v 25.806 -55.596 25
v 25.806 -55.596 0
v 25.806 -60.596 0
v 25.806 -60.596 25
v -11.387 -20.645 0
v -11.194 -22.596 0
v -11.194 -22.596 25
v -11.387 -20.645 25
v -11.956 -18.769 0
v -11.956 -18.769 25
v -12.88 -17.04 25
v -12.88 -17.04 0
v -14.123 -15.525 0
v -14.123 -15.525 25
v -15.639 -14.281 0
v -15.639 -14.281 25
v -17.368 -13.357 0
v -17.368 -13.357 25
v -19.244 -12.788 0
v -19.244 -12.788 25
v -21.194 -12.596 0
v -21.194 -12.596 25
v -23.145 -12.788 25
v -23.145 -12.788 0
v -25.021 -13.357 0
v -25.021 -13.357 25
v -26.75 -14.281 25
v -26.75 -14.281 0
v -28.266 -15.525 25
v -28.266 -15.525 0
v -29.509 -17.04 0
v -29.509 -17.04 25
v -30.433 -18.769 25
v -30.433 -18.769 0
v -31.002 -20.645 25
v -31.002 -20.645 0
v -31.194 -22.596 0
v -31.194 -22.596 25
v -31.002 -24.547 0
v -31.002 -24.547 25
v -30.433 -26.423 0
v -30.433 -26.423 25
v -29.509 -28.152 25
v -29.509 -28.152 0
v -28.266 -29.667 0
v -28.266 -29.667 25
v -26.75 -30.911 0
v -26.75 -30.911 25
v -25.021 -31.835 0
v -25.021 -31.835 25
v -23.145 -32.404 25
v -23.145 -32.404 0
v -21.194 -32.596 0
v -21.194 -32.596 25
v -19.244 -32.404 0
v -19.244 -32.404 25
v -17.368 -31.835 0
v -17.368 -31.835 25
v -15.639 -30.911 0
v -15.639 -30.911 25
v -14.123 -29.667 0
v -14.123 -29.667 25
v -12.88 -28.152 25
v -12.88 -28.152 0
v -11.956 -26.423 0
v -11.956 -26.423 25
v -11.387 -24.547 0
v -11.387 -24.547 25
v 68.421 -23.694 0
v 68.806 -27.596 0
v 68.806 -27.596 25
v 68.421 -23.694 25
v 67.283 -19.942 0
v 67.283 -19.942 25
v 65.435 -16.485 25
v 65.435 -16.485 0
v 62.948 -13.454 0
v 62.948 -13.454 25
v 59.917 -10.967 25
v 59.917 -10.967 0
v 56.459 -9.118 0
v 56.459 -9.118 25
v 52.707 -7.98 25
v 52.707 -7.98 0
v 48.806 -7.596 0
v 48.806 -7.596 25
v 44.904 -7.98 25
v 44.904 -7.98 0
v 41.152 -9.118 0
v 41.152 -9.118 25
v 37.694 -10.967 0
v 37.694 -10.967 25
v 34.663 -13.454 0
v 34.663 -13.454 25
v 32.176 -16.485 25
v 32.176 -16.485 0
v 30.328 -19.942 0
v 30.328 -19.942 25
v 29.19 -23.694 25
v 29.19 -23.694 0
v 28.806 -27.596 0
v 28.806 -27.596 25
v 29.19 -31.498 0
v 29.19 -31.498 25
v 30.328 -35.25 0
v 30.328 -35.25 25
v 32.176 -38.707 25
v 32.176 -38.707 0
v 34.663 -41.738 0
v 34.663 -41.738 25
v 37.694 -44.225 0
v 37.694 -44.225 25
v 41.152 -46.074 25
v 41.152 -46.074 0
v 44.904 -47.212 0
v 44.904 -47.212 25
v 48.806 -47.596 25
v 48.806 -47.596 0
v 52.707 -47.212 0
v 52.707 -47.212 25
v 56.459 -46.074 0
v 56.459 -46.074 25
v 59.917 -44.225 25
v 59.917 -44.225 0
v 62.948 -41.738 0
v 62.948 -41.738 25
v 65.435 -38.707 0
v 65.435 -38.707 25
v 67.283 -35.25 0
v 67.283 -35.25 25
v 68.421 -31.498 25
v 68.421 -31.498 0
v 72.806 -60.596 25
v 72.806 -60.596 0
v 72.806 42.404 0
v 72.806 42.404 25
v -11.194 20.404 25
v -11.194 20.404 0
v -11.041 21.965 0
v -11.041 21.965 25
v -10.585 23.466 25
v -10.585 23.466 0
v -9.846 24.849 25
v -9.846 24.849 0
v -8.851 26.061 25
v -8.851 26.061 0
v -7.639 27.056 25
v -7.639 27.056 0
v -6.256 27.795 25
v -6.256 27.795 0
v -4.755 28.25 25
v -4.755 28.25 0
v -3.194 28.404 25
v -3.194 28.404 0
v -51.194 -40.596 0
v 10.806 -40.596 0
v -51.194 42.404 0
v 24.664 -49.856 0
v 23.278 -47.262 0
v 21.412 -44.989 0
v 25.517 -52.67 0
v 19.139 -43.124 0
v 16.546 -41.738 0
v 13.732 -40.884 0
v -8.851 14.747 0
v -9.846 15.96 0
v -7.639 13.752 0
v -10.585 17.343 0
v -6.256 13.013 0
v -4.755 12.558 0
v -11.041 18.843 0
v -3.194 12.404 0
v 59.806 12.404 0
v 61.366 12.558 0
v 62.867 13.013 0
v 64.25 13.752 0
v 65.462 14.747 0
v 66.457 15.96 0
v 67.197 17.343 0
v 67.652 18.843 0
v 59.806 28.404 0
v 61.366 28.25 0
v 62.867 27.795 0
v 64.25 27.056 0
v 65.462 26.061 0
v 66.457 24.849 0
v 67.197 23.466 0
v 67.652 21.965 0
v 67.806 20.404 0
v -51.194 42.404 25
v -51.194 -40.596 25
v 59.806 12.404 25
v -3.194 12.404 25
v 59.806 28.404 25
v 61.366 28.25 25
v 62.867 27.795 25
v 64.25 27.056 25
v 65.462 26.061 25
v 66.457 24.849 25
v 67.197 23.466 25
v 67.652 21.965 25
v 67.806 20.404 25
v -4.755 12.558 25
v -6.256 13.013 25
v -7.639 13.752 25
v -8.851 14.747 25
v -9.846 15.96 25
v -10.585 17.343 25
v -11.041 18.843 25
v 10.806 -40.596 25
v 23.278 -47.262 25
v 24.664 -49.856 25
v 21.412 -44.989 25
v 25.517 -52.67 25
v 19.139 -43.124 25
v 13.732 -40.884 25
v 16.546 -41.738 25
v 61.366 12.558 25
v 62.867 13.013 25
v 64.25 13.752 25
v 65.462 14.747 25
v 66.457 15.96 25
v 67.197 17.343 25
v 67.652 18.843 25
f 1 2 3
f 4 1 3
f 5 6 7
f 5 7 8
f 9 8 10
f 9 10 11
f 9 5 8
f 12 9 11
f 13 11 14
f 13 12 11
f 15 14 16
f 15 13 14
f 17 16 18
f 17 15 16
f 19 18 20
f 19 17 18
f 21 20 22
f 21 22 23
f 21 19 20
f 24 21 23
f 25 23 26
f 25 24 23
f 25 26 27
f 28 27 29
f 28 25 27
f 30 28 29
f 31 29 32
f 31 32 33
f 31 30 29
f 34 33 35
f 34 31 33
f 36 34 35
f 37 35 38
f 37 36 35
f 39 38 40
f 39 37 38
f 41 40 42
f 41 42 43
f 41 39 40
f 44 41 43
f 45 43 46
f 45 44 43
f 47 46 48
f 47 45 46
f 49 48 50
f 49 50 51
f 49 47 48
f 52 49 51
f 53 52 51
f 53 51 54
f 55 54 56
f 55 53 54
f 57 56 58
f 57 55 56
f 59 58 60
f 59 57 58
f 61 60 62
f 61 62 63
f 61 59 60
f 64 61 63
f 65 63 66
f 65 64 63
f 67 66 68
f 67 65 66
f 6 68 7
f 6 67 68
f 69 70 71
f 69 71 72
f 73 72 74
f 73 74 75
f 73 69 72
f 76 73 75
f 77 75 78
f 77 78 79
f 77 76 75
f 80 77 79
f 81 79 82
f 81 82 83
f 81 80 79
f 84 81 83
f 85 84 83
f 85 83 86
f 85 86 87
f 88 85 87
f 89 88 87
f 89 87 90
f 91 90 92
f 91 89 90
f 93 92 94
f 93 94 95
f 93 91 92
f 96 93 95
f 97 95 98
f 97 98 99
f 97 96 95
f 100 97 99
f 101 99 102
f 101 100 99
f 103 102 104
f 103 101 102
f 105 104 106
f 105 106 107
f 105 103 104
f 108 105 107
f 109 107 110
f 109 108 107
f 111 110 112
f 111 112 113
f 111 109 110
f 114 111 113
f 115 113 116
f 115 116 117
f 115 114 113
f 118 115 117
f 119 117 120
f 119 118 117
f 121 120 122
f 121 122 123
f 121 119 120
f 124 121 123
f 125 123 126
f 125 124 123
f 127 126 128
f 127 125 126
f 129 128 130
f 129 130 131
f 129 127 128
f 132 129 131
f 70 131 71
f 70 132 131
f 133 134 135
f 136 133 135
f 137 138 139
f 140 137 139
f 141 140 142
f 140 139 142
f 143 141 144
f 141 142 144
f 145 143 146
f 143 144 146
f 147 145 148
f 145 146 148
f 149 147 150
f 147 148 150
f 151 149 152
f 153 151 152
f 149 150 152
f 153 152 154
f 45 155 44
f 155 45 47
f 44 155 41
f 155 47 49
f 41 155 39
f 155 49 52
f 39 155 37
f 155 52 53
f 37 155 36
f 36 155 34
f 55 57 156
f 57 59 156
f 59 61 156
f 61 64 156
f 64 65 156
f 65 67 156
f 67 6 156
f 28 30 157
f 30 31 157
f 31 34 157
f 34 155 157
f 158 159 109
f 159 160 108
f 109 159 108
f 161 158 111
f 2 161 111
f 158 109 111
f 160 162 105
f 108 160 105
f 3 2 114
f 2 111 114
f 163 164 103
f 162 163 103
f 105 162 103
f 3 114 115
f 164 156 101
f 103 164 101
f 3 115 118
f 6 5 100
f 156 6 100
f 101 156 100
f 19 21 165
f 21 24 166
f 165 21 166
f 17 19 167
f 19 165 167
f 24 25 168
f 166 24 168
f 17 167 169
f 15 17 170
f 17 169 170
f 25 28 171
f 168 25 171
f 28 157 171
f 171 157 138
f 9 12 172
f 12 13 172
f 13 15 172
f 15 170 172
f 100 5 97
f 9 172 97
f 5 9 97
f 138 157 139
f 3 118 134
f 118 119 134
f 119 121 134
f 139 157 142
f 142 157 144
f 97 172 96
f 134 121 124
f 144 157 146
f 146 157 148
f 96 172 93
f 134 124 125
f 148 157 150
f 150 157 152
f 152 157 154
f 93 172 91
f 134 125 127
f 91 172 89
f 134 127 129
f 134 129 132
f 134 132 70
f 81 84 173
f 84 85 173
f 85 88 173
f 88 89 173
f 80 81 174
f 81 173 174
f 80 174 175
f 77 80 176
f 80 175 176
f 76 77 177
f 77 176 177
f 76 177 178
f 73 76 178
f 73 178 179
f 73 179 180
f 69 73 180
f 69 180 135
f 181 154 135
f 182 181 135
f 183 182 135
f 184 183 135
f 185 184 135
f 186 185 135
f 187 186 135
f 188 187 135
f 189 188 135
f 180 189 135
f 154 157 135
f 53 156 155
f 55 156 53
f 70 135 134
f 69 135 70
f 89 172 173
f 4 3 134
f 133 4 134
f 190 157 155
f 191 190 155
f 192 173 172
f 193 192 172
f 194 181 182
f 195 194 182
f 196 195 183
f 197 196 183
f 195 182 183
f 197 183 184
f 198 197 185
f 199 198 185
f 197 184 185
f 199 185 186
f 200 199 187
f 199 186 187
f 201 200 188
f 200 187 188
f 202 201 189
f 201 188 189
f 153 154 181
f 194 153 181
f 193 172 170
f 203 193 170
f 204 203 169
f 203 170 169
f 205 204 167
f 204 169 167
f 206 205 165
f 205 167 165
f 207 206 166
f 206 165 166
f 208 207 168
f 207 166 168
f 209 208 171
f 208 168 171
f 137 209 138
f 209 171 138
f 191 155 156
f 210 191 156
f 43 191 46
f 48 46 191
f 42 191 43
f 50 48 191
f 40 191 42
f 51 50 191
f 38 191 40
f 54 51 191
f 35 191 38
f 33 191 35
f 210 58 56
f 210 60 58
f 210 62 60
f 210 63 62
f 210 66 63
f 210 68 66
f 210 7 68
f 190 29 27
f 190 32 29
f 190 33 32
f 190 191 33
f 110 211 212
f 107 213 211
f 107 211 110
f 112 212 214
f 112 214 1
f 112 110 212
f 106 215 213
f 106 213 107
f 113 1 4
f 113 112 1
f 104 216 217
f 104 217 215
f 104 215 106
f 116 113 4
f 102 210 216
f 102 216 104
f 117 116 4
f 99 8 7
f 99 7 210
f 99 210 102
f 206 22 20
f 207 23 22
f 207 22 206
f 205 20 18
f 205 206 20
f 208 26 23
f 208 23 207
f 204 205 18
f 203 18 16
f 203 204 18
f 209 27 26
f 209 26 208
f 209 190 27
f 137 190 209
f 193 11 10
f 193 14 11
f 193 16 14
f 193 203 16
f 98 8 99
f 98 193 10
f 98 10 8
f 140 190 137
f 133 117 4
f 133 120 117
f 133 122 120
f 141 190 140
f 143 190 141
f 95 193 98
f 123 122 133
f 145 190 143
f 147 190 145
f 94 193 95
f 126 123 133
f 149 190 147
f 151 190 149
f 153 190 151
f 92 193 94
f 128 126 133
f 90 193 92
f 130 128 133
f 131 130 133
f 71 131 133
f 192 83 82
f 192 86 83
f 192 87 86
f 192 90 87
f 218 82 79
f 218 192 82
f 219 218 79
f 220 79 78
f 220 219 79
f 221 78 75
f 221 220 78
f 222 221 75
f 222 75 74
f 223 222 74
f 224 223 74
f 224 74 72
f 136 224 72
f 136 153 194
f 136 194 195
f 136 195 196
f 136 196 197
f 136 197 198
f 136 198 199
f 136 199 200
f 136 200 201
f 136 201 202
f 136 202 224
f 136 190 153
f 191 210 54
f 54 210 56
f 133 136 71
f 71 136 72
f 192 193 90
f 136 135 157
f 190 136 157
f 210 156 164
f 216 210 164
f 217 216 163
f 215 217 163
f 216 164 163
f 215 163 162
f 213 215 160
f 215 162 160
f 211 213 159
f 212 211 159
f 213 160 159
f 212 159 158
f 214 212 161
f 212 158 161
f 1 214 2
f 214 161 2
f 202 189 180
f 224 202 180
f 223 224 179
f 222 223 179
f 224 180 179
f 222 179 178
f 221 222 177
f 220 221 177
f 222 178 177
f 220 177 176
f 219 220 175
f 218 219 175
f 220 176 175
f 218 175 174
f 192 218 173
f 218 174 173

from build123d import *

# Parameters (mm, degrees)
F0_R     = 10
F0_R_2   = 20
F1_DEPTH = 25


with BuildPart() as f1:
    # F0 (on Top) → F1 (new body)
    with BuildSketch(Plane.XY):
        with BuildLine():
            Line((72.805556, 42.40408), (-51.194444, 42.40408))
            Line((-51.194444, 42.40408), (-51.194444, -40.59592))
            Line((-51.194444, -40.59592), (10.805556, -40.59592))
            ThreePointArc((10.805556, -40.59592), (21.412157, -44.989319), (25.805556, -55.59592))
            Line((25.805556, -55.59592), (25.805556, -60.59592))
            Line((25.805556, -60.59592), (72.805556, -60.59592))
            Line((72.805556, -60.59592), (72.805556, 42.40408))
        make_face()
        with Locations((-21.194444, -22.59592)):
            Circle(F0_R, mode=Mode.SUBTRACT)
        with Locations((48.805556, -27.59592)):
            Circle(F0_R_2, mode=Mode.SUBTRACT)
        with BuildLine():
            Line((-3.194444, 28.40408), (59.805556, 28.40408))
            ThreePointArc((59.805556, 28.40408), (65.46241, 26.060934), (67.805556, 20.40408))
            ThreePointArc((67.805556, 20.40408), (65.46241, 14.747225), (59.805556, 12.40408))
            Line((59.805556, 12.40408), (-3.194444, 12.40408))
            ThreePointArc((-3.194444, 12.40408), (-8.851299, 14.747225), (-11.194444, 20.40408))
            ThreePointArc((-11.194444, 20.40408), (-8.851299, 26.060934), (-3.194444, 28.40408))
        make_face(mode=Mode.SUBTRACT)
    extrude(amount=F1_DEPTH)


solid = f1.part
